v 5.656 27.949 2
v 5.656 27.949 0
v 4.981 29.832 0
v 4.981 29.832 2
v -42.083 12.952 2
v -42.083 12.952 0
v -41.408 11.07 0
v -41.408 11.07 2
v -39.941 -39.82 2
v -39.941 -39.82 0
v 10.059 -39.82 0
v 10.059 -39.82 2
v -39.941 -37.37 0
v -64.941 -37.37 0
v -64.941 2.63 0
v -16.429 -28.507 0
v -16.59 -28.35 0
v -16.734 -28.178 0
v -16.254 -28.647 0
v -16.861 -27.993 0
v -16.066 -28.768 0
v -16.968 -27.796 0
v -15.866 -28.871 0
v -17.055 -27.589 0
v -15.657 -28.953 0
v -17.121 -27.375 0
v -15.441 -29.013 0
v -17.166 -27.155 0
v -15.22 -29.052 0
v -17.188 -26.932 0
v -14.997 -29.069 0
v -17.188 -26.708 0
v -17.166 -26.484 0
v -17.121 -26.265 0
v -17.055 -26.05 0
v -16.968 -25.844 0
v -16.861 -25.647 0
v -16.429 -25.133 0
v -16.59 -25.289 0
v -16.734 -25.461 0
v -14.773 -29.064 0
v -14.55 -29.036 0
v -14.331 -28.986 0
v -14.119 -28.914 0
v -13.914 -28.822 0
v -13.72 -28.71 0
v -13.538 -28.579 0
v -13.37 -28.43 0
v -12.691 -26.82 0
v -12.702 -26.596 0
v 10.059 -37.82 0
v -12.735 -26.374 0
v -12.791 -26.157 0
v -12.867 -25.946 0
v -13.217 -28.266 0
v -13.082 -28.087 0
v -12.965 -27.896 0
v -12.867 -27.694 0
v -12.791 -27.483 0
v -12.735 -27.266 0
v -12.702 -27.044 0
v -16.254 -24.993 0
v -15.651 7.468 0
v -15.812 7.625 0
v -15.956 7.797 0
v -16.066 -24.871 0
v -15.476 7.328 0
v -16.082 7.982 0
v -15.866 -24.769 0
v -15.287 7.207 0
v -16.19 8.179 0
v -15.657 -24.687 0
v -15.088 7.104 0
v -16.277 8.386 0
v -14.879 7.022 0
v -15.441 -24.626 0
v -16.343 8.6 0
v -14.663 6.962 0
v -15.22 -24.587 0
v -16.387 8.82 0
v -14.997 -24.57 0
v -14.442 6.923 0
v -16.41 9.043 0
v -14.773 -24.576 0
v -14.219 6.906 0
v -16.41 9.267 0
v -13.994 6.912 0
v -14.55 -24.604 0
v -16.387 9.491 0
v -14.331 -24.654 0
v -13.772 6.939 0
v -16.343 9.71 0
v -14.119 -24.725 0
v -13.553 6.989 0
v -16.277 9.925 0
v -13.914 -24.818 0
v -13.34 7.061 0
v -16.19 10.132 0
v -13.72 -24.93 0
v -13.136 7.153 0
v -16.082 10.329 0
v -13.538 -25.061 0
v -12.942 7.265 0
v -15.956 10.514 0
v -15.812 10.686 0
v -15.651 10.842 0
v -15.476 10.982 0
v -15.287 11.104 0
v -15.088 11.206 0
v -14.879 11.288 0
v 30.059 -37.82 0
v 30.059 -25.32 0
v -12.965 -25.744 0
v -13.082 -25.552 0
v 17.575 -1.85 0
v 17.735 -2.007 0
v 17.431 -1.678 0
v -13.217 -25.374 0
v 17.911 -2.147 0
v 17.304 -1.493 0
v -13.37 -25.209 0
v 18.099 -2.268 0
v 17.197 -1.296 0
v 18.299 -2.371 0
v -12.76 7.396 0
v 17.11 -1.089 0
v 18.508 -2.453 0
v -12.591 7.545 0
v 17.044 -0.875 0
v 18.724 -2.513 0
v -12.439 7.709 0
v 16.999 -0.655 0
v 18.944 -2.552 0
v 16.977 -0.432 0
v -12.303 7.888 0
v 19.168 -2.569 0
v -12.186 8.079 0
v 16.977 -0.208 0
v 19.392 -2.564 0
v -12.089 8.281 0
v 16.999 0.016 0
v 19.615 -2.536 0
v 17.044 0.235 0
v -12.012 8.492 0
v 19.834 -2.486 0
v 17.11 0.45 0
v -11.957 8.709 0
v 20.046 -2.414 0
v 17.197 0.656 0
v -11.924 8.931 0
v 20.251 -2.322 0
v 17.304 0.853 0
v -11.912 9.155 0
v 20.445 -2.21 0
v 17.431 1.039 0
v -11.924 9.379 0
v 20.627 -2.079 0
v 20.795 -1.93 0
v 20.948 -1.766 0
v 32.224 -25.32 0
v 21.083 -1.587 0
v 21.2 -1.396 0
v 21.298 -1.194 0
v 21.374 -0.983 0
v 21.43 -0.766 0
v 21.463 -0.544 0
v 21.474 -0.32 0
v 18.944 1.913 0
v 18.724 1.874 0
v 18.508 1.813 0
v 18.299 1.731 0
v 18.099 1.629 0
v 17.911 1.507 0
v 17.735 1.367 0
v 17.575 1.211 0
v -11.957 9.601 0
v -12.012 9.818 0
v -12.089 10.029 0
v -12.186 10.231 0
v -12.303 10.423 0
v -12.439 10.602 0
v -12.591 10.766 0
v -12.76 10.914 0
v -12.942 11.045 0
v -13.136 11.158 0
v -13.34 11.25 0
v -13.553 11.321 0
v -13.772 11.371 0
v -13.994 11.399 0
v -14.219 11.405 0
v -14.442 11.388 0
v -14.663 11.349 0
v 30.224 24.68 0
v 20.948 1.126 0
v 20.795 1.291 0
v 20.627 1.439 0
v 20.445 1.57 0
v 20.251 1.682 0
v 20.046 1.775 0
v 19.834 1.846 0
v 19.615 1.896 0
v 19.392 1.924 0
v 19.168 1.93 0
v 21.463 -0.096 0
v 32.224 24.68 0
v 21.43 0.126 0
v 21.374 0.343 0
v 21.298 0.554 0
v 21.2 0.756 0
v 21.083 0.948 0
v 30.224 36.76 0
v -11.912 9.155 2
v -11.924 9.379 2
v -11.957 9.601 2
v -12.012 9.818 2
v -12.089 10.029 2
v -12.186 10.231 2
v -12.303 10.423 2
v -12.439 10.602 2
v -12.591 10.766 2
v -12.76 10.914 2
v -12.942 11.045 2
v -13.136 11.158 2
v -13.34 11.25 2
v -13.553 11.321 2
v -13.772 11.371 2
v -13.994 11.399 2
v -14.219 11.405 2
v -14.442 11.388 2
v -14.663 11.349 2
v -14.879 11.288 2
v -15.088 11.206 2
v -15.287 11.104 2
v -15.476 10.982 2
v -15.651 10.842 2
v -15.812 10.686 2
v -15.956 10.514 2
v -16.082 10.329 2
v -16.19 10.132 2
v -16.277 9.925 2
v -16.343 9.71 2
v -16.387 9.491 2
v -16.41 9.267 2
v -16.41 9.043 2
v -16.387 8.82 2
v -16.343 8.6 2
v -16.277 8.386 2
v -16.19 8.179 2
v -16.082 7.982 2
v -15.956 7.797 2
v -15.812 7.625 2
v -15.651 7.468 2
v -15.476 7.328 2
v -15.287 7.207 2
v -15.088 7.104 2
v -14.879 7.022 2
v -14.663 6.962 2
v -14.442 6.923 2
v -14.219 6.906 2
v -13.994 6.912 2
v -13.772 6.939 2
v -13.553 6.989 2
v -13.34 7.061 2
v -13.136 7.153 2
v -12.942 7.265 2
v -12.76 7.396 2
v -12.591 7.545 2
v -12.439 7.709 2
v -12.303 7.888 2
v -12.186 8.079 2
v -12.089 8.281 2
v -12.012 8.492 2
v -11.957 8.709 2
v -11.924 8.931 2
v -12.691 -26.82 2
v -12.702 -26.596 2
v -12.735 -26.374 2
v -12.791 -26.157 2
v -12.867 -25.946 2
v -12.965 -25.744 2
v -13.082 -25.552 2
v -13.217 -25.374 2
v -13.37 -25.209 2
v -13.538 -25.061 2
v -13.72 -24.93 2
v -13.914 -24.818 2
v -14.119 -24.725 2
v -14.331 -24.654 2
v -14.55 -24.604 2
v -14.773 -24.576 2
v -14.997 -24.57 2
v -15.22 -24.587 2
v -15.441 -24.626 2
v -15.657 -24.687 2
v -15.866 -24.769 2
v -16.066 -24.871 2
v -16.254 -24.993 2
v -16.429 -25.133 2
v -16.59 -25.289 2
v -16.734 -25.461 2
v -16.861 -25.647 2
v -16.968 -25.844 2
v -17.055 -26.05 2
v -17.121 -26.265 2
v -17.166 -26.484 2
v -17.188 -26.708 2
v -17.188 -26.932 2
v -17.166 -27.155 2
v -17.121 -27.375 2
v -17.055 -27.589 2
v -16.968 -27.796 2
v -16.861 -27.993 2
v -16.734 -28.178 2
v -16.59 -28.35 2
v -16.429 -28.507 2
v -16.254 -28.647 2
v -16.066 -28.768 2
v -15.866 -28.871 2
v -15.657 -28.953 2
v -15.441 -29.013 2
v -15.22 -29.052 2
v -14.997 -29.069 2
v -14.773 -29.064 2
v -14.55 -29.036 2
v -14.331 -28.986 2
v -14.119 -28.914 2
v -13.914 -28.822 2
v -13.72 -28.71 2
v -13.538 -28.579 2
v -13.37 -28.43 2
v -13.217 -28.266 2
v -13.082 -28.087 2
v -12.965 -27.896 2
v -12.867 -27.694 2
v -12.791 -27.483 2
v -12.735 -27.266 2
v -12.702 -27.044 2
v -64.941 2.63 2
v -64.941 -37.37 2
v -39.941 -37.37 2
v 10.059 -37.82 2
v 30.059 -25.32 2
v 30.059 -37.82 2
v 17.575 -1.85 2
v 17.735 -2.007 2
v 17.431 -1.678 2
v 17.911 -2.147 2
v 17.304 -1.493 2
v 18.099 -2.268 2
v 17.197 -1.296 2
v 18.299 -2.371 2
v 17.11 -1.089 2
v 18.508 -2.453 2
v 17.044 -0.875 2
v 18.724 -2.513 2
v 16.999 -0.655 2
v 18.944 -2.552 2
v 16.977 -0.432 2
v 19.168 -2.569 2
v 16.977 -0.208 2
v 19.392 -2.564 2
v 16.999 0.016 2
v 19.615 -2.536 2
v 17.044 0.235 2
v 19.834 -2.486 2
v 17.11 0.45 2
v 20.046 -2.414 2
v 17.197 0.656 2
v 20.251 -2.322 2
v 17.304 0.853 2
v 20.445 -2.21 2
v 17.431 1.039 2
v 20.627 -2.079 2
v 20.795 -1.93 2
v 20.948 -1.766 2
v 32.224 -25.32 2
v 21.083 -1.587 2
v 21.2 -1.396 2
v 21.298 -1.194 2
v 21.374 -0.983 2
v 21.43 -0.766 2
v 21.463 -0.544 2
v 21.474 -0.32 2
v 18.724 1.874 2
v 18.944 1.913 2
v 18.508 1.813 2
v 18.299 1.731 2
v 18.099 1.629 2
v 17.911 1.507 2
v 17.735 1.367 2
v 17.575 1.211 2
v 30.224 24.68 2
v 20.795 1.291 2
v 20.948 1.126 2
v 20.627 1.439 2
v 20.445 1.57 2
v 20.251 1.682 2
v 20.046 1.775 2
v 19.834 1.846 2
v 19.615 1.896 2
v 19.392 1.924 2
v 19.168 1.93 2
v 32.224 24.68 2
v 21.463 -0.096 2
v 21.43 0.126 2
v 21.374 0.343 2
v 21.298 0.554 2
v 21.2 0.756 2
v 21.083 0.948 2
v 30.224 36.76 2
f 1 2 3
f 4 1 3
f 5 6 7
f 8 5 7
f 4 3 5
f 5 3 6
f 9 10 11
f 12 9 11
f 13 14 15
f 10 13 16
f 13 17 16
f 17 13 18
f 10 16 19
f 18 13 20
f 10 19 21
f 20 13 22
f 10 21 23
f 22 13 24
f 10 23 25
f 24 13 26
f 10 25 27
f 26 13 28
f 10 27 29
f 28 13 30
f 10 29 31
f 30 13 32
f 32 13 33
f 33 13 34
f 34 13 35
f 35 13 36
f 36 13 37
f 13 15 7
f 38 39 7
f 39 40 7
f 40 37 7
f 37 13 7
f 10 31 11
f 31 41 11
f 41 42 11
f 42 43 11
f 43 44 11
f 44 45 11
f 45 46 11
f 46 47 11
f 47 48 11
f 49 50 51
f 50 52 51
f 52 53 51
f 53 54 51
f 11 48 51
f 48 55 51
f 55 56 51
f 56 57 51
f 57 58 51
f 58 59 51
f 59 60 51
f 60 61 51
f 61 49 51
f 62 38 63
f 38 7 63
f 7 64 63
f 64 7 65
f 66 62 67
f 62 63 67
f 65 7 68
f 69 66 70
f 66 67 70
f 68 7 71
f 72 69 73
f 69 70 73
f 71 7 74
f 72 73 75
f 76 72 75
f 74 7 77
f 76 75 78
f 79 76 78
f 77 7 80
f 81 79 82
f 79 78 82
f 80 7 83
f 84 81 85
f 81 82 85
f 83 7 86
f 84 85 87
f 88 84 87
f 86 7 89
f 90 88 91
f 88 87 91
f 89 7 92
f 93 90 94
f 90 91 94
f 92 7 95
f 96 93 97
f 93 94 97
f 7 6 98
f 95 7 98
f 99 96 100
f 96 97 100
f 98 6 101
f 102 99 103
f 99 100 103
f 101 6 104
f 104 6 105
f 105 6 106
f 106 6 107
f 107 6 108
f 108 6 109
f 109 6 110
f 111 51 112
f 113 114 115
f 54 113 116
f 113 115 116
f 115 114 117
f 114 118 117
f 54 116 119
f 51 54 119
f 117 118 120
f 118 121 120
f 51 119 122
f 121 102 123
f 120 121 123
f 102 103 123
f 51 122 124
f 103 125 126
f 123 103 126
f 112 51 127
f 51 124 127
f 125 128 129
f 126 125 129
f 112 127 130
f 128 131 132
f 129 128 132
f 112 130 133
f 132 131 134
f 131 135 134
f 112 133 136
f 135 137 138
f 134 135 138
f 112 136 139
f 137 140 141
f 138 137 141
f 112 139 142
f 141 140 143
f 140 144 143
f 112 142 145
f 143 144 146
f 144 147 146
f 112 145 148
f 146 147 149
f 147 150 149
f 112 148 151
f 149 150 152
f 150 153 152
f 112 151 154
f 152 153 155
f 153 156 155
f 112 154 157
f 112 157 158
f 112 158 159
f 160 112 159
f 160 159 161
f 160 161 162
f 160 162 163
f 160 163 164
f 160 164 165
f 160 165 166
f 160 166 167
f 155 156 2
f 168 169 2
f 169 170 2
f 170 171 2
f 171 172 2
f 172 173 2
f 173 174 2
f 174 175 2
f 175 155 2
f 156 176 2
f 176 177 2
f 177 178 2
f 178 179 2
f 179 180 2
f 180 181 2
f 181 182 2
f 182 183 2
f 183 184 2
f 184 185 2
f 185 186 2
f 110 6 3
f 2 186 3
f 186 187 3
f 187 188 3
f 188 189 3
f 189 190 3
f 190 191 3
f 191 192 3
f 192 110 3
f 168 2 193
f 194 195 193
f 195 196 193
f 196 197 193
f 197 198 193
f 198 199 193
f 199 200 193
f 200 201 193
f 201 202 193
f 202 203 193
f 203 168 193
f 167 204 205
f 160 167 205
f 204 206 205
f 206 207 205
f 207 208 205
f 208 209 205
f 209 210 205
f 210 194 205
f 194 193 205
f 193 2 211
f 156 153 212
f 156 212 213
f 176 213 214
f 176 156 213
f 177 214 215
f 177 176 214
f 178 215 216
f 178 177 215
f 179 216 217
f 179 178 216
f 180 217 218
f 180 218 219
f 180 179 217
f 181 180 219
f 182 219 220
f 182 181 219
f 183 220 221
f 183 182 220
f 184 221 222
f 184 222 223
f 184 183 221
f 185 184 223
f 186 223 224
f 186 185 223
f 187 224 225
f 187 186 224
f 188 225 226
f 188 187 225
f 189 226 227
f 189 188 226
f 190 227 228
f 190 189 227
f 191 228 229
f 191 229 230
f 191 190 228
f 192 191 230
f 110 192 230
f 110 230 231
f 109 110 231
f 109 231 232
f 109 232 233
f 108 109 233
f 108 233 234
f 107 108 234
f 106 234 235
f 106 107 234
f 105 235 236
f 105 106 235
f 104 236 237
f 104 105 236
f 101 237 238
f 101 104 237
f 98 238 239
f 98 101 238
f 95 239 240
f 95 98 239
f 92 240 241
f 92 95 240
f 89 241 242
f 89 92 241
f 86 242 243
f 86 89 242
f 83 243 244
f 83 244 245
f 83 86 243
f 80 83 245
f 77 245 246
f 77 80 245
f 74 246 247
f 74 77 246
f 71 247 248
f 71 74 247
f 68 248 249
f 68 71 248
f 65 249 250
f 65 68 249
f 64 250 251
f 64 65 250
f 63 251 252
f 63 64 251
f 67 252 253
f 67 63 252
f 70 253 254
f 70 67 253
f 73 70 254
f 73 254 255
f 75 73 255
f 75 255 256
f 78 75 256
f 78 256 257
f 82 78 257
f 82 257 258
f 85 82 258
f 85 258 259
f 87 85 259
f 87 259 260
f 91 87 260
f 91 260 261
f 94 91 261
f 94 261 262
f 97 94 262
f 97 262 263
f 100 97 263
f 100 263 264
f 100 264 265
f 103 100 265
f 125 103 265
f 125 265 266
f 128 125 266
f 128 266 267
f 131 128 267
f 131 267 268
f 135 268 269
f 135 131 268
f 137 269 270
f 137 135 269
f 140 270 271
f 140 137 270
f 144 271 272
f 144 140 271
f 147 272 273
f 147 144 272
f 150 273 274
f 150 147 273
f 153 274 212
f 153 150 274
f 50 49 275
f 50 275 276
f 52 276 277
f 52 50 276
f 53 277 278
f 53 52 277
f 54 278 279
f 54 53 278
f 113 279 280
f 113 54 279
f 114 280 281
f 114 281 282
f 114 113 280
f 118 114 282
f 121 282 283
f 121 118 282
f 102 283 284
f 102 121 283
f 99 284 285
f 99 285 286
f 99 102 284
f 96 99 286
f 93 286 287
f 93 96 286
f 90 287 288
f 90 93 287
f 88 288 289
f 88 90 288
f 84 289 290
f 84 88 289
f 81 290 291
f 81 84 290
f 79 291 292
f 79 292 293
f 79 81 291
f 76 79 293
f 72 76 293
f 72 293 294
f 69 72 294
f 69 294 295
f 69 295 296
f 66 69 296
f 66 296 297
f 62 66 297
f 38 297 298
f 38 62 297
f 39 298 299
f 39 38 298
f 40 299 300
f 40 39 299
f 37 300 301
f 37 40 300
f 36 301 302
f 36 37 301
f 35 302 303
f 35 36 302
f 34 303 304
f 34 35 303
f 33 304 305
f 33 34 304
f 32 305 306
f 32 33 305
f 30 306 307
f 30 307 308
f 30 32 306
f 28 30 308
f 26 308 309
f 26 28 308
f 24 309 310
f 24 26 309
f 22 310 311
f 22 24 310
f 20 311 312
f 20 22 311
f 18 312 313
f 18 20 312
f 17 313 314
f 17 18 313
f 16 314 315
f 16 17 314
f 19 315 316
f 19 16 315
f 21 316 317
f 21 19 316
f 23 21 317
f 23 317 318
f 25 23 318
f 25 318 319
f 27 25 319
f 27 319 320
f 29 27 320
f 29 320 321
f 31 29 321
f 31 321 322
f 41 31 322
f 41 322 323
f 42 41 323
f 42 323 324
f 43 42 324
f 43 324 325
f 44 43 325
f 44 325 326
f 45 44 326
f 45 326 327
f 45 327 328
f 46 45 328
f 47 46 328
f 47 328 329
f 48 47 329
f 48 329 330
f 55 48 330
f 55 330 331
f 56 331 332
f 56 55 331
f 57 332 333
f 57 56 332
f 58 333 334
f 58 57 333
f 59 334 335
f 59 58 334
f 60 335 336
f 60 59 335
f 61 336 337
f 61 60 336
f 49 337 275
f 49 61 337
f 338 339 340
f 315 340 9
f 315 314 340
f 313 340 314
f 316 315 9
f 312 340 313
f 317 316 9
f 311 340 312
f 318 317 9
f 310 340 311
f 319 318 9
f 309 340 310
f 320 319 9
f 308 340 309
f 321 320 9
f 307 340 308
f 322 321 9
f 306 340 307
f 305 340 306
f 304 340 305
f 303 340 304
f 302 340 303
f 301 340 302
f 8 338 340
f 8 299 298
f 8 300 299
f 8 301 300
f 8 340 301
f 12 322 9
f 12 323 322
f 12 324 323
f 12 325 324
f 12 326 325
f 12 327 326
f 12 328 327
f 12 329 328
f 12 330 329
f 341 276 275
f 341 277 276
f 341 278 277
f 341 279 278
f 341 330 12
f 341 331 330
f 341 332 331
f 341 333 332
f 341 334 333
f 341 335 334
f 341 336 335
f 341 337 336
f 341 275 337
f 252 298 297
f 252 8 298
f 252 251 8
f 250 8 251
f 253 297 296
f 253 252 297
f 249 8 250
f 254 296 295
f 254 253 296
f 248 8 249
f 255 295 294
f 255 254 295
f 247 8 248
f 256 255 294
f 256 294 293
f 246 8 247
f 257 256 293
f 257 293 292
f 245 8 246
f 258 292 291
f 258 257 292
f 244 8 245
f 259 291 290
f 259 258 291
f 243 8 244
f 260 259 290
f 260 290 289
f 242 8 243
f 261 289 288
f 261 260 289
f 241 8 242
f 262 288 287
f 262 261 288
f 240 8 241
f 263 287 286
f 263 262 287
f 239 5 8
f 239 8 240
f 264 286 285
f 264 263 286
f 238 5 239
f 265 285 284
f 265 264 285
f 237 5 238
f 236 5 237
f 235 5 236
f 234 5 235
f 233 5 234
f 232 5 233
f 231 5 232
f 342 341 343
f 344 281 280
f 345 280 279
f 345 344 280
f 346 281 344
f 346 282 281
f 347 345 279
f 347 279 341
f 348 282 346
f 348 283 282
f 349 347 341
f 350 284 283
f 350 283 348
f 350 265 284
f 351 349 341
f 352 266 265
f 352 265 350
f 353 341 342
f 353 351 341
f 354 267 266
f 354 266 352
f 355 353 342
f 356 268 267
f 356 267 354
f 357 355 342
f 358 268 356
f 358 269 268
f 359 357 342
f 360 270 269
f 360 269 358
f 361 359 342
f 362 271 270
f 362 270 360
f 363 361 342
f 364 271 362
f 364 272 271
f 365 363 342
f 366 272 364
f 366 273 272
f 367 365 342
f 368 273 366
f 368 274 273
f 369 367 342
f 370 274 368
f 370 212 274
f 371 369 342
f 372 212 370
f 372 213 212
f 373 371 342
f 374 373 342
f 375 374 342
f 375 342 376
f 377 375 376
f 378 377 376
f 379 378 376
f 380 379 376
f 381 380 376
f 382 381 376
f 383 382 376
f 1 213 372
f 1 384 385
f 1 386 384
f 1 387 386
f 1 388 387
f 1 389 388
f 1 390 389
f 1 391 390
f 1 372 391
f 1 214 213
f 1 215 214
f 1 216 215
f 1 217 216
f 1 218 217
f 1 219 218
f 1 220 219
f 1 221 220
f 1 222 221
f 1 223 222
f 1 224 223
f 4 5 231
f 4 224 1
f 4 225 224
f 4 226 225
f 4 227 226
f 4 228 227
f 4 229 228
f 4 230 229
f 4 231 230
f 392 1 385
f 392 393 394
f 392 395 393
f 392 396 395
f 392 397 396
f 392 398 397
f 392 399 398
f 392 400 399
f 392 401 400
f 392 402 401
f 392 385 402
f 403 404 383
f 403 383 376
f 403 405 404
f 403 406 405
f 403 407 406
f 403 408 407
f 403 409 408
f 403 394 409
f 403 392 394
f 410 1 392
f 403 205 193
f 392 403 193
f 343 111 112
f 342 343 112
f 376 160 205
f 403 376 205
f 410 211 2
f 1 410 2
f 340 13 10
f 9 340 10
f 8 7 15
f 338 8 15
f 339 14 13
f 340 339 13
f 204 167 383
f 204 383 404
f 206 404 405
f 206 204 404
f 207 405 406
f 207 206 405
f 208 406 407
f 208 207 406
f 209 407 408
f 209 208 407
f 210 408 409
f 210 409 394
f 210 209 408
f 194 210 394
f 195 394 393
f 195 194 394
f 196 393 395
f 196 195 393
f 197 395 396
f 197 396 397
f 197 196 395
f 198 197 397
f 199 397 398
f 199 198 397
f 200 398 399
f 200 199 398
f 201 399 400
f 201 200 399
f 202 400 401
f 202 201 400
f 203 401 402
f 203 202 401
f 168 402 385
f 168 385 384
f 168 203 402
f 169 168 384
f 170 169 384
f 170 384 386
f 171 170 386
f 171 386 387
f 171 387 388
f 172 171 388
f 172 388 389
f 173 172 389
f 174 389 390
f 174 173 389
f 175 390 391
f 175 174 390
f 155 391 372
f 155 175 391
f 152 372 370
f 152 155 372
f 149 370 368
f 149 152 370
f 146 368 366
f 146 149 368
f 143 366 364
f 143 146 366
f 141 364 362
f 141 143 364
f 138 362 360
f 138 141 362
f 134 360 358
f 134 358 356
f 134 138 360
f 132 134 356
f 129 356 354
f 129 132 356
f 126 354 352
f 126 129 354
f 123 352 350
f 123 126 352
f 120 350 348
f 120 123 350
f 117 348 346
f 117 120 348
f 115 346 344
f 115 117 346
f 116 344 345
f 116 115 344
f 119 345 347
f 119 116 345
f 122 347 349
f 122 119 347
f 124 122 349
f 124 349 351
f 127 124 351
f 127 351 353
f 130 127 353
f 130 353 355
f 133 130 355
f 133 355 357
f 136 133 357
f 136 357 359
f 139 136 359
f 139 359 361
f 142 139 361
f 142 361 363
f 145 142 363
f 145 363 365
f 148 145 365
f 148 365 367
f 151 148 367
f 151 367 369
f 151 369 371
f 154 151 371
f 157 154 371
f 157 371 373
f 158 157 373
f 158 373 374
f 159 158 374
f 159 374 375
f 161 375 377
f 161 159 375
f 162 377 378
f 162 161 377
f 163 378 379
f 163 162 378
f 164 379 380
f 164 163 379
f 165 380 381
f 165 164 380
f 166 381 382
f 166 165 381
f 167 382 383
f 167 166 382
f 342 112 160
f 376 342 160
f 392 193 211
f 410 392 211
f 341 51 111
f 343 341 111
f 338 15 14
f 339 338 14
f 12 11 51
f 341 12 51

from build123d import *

# Parameters (mm, degrees)
EXTRUDE_1_DEPTH          = 2
SKETCH_3_R               = 2.25
CUT_EXTRUDE_1_DEPTH      = 2
CUT_EXTRUDE_1_DEPTH_BACK = 10


with BuildPart() as part:
    # 草图2 → 凸台-拉伸1 (new body)
    with BuildSketch(Plane.XY):
        Polygon((30.22420133, 24.680203113), (30.22420133, 36.760203113), (5.656415061, 27.949194211), (4.981241965, 29.831783197), (-42.083482687, 12.952455799), (-41.408309591, 11.069866813), (-64.940671917, 2.630203113), (-64.940671917, -37.369796887), (-39.940671917, -37.369796887), (-39.940671917, -39.819796887), (10.059328083, -39.819796887), (10.059328083, -37.819796887), (30.059328083, -37.819796887), (30.059328083, -25.319796887), (32.22420133, -25.319796887), (32.22420133, 24.680203113), align=None)
    extrude(amount=EXTRUDE_1_DEPTH)

    # 草图3 → 切除-拉伸1 (cut, two sides)
    with BuildSketch(Plane.XY) as cut_extrude_1_sk:
        with Locations((-14.162495237, 9.155291089)):
            Circle(SKETCH_3_R)
        with Locations((19.22420133, -0.319796887)):
            Circle(SKETCH_3_R)
        with Locations((-14.940671917, -26.819796887)):
            Circle(SKETCH_3_R)
    extrude(amount=CUT_EXTRUDE_1_DEPTH, mode=Mode.SUBTRACT)
    extrude(cut_extrude_1_sk.sketch, amount=-CUT_EXTRUDE_1_DEPTH_BACK, mode=Mode.SUBTRACT)


solid = part.part
